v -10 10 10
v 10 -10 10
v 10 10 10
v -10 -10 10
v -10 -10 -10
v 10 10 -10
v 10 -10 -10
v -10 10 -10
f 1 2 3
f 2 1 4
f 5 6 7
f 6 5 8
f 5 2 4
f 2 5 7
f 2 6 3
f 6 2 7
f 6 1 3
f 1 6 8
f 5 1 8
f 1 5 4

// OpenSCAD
/* [Dimensions] */
size = 20; // [5:50:1]

cube([size, size, size], center=true);
